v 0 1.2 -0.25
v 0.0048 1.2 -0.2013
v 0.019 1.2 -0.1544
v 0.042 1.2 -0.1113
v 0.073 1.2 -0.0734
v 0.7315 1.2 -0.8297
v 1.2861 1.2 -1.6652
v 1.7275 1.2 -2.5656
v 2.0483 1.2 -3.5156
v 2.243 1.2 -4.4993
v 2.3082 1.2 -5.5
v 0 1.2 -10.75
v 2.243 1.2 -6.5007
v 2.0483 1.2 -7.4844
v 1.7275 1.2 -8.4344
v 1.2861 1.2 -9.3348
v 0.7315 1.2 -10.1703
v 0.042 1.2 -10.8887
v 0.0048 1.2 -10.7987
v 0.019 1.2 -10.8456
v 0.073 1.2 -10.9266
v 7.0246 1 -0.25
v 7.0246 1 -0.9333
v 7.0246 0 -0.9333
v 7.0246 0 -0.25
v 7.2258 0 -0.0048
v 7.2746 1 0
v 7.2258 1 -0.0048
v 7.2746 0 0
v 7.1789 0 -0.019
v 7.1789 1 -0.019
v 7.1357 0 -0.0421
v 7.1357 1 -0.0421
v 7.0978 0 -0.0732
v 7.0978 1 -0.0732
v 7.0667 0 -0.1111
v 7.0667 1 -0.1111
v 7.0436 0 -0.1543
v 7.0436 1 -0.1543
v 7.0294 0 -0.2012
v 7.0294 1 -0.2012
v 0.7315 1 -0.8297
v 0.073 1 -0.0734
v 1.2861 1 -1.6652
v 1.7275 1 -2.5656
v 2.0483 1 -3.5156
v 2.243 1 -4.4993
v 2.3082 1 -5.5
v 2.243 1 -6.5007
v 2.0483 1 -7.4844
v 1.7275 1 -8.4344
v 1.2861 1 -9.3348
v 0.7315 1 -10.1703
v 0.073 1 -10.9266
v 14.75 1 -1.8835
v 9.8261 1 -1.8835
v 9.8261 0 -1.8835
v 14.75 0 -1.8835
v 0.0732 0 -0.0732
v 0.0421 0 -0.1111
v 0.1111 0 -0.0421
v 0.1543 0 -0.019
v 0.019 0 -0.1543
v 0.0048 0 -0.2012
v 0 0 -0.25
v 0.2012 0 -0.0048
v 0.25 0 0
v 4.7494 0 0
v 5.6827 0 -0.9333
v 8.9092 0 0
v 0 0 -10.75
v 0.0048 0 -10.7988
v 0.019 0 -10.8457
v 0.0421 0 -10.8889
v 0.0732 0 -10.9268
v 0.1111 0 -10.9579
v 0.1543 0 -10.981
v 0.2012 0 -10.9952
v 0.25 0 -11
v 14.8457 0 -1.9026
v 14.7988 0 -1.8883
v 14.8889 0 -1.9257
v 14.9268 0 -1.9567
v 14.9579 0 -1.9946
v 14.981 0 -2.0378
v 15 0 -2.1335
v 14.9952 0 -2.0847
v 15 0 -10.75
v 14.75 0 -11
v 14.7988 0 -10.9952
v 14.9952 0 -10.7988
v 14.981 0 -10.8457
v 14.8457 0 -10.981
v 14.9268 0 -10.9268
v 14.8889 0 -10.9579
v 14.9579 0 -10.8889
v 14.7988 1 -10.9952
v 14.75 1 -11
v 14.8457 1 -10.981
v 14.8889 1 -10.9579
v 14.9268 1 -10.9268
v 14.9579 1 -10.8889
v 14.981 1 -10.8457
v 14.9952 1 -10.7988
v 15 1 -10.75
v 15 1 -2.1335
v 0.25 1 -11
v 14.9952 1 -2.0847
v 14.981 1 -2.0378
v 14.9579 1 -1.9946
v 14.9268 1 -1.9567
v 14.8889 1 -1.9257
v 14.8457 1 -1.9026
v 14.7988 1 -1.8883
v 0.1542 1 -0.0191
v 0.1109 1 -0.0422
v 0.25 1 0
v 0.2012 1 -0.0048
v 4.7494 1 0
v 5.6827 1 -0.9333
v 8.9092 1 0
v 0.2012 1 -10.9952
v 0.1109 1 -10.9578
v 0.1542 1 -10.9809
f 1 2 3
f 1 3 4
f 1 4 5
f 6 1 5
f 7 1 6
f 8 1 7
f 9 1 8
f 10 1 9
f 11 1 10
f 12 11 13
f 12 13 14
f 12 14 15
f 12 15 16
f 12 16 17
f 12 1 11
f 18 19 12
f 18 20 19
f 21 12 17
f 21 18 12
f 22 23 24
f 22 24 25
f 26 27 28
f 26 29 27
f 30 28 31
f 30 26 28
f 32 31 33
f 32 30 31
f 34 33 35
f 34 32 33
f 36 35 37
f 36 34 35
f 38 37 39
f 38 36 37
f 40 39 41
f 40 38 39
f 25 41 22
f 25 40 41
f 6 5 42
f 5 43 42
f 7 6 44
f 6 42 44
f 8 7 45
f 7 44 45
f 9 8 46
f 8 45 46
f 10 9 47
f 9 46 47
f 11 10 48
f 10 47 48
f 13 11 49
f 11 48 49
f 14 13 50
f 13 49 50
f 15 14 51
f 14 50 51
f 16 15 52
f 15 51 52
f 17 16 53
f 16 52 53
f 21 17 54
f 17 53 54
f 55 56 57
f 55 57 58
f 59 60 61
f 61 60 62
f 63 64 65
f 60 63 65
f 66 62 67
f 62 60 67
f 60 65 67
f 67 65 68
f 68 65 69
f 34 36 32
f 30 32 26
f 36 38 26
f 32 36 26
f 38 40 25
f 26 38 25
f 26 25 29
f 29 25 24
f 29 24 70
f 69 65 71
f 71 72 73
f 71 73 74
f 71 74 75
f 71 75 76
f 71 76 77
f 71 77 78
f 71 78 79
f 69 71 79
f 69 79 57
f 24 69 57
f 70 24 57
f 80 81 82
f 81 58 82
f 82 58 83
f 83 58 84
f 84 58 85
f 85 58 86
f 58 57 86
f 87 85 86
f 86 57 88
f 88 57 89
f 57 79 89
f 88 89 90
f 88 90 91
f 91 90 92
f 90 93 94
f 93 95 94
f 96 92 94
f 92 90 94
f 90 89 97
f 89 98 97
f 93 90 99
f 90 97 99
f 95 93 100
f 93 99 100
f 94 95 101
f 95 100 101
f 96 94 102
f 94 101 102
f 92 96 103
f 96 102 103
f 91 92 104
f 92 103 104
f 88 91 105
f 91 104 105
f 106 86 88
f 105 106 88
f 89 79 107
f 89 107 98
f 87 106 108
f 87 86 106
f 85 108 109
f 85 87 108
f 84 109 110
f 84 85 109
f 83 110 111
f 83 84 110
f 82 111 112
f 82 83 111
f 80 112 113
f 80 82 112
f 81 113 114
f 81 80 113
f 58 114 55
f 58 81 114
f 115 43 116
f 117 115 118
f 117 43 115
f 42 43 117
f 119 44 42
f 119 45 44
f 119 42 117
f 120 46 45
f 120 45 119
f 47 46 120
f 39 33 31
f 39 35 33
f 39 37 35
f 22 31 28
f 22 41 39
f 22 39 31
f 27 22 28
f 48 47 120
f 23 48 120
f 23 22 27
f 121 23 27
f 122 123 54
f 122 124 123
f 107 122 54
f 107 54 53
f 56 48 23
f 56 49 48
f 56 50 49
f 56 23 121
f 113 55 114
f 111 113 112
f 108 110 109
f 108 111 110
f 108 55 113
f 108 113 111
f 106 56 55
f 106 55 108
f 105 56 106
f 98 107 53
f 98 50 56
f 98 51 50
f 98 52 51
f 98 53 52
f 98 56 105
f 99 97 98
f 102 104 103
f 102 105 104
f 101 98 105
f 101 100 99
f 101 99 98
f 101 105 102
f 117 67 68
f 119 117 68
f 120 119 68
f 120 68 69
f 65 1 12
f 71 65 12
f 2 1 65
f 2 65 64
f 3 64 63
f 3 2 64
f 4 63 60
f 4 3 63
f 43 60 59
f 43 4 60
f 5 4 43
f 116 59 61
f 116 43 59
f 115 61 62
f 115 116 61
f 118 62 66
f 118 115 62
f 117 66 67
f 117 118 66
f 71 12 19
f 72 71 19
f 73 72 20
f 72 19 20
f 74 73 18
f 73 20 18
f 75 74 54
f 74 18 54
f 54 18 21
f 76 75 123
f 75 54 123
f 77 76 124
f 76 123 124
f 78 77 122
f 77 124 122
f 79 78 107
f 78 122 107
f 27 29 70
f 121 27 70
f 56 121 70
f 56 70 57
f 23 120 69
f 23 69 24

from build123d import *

# Parameters (mm, degrees)
SKETCH1_W           = 15
SKETCH1_H           = 11
BOSS_EXTRUDE1_DEPTH = 1
CUT_EXTRUDE3_DEPTH  = 19.62793601
CUT_EXTRUDE4_DEPTH  = 19.62793601
FILLET3_R           = 0.25
FILLET4_R           = 0.25
SKETCH8_R           = 7.705
BOSS_EXTRUDE2_DEPTH = 0.2
SKETCH12_W          = 14.564245133
SKETCH12_H          = 17.019207238
CUT_EXTRUDE5_DEPTH  = 21.020290333
FILLET5_R           = 0.25


with BuildPart() as part:
    # Sketch1 → Boss-Extrude1 (new body)
    with BuildSketch(Plane(origin=(0, 0, 0), x_dir=(1, 0, 0), z_dir=(0, 1, 0))):
        with Locations((7.5, 5.5)):
            Rectangle(SKETCH1_W, SKETCH1_H)
    extrude(amount=BOSS_EXTRUDE1_DEPTH)

    # Sketch4 → Cut-Extrude3 (cut, through all)
    with BuildSketch(Plane(origin=(0, 1, 0), x_dir=(1, 0, 0), z_dir=(0, 1, 0))):
        Polygon((4.749438202, 0), (5.682709114, 0.933270911), (7.024594257, 0.933270911), (7.024594257, 0), align=None)
    extrude(amount=-CUT_EXTRUDE3_DEPTH, mode=Mode.SUBTRACT)

    # Sketch6 → Cut-Extrude4 (cut, through all)
    with BuildSketch(Plane(origin=(0, 1, 0), x_dir=(1, 0, 0), z_dir=(0, 1, 0))):
        Polygon((8.909238452, 0), (9.826092385, 1.883520599), (15, 1.883520599), (15, 0), align=None)
    extrude(amount=-CUT_EXTRUDE4_DEPTH, mode=Mode.SUBTRACT)

    # Fillet3
    fillet3_edges = [part.edges().sort_by_distance(p)[0] for p in [
        (15, 0.5, -1.883520599),
    ]]
    fillet(fillet3_edges, radius=FILLET3_R)

    # Fillet4
    fillet4_edges = [part.edges().sort_by_distance(p)[0] for p in [
        (7.024594257, 0.5, 0),
    ]]
    fillet(fillet4_edges, radius=FILLET4_R)

    # Sketch8 → Boss-Extrude2 (add)
    with BuildSketch(Plane(origin=(0, 1, 0), x_dir=(1, 0, 0), z_dir=(0, 1, 0))):
        with Locations(Location((-5.396795531, 5.5, 0), (0, 0, 45.538670416))):
            Circle(SKETCH8_R)
    extrude(amount=BOSS_EXTRUDE2_DEPTH)

    # Sketch12 → Cut-Extrude5 (cut, through all)
    with BuildSketch(Plane(origin=(0, 1.2, 0), x_dir=(1, 0, 0), z_dir=(0, 1, 0))):
        with Locations((-7.282122567, 5.49450546)):
            Rectangle(SKETCH12_W, SKETCH12_H)
    extrude(amount=-CUT_EXTRUDE5_DEPTH, mode=Mode.SUBTRACT)

    # Fillet5
    fillet5_edges = [part.edges().sort_by_distance(p)[0] for p in [
        (15, 0.5, -11),
        (0, 0.5, 0),
        (0, 0.5, -11),
    ]]
    fillet(fillet5_edges, radius=FILLET5_R)


solid = part.part
